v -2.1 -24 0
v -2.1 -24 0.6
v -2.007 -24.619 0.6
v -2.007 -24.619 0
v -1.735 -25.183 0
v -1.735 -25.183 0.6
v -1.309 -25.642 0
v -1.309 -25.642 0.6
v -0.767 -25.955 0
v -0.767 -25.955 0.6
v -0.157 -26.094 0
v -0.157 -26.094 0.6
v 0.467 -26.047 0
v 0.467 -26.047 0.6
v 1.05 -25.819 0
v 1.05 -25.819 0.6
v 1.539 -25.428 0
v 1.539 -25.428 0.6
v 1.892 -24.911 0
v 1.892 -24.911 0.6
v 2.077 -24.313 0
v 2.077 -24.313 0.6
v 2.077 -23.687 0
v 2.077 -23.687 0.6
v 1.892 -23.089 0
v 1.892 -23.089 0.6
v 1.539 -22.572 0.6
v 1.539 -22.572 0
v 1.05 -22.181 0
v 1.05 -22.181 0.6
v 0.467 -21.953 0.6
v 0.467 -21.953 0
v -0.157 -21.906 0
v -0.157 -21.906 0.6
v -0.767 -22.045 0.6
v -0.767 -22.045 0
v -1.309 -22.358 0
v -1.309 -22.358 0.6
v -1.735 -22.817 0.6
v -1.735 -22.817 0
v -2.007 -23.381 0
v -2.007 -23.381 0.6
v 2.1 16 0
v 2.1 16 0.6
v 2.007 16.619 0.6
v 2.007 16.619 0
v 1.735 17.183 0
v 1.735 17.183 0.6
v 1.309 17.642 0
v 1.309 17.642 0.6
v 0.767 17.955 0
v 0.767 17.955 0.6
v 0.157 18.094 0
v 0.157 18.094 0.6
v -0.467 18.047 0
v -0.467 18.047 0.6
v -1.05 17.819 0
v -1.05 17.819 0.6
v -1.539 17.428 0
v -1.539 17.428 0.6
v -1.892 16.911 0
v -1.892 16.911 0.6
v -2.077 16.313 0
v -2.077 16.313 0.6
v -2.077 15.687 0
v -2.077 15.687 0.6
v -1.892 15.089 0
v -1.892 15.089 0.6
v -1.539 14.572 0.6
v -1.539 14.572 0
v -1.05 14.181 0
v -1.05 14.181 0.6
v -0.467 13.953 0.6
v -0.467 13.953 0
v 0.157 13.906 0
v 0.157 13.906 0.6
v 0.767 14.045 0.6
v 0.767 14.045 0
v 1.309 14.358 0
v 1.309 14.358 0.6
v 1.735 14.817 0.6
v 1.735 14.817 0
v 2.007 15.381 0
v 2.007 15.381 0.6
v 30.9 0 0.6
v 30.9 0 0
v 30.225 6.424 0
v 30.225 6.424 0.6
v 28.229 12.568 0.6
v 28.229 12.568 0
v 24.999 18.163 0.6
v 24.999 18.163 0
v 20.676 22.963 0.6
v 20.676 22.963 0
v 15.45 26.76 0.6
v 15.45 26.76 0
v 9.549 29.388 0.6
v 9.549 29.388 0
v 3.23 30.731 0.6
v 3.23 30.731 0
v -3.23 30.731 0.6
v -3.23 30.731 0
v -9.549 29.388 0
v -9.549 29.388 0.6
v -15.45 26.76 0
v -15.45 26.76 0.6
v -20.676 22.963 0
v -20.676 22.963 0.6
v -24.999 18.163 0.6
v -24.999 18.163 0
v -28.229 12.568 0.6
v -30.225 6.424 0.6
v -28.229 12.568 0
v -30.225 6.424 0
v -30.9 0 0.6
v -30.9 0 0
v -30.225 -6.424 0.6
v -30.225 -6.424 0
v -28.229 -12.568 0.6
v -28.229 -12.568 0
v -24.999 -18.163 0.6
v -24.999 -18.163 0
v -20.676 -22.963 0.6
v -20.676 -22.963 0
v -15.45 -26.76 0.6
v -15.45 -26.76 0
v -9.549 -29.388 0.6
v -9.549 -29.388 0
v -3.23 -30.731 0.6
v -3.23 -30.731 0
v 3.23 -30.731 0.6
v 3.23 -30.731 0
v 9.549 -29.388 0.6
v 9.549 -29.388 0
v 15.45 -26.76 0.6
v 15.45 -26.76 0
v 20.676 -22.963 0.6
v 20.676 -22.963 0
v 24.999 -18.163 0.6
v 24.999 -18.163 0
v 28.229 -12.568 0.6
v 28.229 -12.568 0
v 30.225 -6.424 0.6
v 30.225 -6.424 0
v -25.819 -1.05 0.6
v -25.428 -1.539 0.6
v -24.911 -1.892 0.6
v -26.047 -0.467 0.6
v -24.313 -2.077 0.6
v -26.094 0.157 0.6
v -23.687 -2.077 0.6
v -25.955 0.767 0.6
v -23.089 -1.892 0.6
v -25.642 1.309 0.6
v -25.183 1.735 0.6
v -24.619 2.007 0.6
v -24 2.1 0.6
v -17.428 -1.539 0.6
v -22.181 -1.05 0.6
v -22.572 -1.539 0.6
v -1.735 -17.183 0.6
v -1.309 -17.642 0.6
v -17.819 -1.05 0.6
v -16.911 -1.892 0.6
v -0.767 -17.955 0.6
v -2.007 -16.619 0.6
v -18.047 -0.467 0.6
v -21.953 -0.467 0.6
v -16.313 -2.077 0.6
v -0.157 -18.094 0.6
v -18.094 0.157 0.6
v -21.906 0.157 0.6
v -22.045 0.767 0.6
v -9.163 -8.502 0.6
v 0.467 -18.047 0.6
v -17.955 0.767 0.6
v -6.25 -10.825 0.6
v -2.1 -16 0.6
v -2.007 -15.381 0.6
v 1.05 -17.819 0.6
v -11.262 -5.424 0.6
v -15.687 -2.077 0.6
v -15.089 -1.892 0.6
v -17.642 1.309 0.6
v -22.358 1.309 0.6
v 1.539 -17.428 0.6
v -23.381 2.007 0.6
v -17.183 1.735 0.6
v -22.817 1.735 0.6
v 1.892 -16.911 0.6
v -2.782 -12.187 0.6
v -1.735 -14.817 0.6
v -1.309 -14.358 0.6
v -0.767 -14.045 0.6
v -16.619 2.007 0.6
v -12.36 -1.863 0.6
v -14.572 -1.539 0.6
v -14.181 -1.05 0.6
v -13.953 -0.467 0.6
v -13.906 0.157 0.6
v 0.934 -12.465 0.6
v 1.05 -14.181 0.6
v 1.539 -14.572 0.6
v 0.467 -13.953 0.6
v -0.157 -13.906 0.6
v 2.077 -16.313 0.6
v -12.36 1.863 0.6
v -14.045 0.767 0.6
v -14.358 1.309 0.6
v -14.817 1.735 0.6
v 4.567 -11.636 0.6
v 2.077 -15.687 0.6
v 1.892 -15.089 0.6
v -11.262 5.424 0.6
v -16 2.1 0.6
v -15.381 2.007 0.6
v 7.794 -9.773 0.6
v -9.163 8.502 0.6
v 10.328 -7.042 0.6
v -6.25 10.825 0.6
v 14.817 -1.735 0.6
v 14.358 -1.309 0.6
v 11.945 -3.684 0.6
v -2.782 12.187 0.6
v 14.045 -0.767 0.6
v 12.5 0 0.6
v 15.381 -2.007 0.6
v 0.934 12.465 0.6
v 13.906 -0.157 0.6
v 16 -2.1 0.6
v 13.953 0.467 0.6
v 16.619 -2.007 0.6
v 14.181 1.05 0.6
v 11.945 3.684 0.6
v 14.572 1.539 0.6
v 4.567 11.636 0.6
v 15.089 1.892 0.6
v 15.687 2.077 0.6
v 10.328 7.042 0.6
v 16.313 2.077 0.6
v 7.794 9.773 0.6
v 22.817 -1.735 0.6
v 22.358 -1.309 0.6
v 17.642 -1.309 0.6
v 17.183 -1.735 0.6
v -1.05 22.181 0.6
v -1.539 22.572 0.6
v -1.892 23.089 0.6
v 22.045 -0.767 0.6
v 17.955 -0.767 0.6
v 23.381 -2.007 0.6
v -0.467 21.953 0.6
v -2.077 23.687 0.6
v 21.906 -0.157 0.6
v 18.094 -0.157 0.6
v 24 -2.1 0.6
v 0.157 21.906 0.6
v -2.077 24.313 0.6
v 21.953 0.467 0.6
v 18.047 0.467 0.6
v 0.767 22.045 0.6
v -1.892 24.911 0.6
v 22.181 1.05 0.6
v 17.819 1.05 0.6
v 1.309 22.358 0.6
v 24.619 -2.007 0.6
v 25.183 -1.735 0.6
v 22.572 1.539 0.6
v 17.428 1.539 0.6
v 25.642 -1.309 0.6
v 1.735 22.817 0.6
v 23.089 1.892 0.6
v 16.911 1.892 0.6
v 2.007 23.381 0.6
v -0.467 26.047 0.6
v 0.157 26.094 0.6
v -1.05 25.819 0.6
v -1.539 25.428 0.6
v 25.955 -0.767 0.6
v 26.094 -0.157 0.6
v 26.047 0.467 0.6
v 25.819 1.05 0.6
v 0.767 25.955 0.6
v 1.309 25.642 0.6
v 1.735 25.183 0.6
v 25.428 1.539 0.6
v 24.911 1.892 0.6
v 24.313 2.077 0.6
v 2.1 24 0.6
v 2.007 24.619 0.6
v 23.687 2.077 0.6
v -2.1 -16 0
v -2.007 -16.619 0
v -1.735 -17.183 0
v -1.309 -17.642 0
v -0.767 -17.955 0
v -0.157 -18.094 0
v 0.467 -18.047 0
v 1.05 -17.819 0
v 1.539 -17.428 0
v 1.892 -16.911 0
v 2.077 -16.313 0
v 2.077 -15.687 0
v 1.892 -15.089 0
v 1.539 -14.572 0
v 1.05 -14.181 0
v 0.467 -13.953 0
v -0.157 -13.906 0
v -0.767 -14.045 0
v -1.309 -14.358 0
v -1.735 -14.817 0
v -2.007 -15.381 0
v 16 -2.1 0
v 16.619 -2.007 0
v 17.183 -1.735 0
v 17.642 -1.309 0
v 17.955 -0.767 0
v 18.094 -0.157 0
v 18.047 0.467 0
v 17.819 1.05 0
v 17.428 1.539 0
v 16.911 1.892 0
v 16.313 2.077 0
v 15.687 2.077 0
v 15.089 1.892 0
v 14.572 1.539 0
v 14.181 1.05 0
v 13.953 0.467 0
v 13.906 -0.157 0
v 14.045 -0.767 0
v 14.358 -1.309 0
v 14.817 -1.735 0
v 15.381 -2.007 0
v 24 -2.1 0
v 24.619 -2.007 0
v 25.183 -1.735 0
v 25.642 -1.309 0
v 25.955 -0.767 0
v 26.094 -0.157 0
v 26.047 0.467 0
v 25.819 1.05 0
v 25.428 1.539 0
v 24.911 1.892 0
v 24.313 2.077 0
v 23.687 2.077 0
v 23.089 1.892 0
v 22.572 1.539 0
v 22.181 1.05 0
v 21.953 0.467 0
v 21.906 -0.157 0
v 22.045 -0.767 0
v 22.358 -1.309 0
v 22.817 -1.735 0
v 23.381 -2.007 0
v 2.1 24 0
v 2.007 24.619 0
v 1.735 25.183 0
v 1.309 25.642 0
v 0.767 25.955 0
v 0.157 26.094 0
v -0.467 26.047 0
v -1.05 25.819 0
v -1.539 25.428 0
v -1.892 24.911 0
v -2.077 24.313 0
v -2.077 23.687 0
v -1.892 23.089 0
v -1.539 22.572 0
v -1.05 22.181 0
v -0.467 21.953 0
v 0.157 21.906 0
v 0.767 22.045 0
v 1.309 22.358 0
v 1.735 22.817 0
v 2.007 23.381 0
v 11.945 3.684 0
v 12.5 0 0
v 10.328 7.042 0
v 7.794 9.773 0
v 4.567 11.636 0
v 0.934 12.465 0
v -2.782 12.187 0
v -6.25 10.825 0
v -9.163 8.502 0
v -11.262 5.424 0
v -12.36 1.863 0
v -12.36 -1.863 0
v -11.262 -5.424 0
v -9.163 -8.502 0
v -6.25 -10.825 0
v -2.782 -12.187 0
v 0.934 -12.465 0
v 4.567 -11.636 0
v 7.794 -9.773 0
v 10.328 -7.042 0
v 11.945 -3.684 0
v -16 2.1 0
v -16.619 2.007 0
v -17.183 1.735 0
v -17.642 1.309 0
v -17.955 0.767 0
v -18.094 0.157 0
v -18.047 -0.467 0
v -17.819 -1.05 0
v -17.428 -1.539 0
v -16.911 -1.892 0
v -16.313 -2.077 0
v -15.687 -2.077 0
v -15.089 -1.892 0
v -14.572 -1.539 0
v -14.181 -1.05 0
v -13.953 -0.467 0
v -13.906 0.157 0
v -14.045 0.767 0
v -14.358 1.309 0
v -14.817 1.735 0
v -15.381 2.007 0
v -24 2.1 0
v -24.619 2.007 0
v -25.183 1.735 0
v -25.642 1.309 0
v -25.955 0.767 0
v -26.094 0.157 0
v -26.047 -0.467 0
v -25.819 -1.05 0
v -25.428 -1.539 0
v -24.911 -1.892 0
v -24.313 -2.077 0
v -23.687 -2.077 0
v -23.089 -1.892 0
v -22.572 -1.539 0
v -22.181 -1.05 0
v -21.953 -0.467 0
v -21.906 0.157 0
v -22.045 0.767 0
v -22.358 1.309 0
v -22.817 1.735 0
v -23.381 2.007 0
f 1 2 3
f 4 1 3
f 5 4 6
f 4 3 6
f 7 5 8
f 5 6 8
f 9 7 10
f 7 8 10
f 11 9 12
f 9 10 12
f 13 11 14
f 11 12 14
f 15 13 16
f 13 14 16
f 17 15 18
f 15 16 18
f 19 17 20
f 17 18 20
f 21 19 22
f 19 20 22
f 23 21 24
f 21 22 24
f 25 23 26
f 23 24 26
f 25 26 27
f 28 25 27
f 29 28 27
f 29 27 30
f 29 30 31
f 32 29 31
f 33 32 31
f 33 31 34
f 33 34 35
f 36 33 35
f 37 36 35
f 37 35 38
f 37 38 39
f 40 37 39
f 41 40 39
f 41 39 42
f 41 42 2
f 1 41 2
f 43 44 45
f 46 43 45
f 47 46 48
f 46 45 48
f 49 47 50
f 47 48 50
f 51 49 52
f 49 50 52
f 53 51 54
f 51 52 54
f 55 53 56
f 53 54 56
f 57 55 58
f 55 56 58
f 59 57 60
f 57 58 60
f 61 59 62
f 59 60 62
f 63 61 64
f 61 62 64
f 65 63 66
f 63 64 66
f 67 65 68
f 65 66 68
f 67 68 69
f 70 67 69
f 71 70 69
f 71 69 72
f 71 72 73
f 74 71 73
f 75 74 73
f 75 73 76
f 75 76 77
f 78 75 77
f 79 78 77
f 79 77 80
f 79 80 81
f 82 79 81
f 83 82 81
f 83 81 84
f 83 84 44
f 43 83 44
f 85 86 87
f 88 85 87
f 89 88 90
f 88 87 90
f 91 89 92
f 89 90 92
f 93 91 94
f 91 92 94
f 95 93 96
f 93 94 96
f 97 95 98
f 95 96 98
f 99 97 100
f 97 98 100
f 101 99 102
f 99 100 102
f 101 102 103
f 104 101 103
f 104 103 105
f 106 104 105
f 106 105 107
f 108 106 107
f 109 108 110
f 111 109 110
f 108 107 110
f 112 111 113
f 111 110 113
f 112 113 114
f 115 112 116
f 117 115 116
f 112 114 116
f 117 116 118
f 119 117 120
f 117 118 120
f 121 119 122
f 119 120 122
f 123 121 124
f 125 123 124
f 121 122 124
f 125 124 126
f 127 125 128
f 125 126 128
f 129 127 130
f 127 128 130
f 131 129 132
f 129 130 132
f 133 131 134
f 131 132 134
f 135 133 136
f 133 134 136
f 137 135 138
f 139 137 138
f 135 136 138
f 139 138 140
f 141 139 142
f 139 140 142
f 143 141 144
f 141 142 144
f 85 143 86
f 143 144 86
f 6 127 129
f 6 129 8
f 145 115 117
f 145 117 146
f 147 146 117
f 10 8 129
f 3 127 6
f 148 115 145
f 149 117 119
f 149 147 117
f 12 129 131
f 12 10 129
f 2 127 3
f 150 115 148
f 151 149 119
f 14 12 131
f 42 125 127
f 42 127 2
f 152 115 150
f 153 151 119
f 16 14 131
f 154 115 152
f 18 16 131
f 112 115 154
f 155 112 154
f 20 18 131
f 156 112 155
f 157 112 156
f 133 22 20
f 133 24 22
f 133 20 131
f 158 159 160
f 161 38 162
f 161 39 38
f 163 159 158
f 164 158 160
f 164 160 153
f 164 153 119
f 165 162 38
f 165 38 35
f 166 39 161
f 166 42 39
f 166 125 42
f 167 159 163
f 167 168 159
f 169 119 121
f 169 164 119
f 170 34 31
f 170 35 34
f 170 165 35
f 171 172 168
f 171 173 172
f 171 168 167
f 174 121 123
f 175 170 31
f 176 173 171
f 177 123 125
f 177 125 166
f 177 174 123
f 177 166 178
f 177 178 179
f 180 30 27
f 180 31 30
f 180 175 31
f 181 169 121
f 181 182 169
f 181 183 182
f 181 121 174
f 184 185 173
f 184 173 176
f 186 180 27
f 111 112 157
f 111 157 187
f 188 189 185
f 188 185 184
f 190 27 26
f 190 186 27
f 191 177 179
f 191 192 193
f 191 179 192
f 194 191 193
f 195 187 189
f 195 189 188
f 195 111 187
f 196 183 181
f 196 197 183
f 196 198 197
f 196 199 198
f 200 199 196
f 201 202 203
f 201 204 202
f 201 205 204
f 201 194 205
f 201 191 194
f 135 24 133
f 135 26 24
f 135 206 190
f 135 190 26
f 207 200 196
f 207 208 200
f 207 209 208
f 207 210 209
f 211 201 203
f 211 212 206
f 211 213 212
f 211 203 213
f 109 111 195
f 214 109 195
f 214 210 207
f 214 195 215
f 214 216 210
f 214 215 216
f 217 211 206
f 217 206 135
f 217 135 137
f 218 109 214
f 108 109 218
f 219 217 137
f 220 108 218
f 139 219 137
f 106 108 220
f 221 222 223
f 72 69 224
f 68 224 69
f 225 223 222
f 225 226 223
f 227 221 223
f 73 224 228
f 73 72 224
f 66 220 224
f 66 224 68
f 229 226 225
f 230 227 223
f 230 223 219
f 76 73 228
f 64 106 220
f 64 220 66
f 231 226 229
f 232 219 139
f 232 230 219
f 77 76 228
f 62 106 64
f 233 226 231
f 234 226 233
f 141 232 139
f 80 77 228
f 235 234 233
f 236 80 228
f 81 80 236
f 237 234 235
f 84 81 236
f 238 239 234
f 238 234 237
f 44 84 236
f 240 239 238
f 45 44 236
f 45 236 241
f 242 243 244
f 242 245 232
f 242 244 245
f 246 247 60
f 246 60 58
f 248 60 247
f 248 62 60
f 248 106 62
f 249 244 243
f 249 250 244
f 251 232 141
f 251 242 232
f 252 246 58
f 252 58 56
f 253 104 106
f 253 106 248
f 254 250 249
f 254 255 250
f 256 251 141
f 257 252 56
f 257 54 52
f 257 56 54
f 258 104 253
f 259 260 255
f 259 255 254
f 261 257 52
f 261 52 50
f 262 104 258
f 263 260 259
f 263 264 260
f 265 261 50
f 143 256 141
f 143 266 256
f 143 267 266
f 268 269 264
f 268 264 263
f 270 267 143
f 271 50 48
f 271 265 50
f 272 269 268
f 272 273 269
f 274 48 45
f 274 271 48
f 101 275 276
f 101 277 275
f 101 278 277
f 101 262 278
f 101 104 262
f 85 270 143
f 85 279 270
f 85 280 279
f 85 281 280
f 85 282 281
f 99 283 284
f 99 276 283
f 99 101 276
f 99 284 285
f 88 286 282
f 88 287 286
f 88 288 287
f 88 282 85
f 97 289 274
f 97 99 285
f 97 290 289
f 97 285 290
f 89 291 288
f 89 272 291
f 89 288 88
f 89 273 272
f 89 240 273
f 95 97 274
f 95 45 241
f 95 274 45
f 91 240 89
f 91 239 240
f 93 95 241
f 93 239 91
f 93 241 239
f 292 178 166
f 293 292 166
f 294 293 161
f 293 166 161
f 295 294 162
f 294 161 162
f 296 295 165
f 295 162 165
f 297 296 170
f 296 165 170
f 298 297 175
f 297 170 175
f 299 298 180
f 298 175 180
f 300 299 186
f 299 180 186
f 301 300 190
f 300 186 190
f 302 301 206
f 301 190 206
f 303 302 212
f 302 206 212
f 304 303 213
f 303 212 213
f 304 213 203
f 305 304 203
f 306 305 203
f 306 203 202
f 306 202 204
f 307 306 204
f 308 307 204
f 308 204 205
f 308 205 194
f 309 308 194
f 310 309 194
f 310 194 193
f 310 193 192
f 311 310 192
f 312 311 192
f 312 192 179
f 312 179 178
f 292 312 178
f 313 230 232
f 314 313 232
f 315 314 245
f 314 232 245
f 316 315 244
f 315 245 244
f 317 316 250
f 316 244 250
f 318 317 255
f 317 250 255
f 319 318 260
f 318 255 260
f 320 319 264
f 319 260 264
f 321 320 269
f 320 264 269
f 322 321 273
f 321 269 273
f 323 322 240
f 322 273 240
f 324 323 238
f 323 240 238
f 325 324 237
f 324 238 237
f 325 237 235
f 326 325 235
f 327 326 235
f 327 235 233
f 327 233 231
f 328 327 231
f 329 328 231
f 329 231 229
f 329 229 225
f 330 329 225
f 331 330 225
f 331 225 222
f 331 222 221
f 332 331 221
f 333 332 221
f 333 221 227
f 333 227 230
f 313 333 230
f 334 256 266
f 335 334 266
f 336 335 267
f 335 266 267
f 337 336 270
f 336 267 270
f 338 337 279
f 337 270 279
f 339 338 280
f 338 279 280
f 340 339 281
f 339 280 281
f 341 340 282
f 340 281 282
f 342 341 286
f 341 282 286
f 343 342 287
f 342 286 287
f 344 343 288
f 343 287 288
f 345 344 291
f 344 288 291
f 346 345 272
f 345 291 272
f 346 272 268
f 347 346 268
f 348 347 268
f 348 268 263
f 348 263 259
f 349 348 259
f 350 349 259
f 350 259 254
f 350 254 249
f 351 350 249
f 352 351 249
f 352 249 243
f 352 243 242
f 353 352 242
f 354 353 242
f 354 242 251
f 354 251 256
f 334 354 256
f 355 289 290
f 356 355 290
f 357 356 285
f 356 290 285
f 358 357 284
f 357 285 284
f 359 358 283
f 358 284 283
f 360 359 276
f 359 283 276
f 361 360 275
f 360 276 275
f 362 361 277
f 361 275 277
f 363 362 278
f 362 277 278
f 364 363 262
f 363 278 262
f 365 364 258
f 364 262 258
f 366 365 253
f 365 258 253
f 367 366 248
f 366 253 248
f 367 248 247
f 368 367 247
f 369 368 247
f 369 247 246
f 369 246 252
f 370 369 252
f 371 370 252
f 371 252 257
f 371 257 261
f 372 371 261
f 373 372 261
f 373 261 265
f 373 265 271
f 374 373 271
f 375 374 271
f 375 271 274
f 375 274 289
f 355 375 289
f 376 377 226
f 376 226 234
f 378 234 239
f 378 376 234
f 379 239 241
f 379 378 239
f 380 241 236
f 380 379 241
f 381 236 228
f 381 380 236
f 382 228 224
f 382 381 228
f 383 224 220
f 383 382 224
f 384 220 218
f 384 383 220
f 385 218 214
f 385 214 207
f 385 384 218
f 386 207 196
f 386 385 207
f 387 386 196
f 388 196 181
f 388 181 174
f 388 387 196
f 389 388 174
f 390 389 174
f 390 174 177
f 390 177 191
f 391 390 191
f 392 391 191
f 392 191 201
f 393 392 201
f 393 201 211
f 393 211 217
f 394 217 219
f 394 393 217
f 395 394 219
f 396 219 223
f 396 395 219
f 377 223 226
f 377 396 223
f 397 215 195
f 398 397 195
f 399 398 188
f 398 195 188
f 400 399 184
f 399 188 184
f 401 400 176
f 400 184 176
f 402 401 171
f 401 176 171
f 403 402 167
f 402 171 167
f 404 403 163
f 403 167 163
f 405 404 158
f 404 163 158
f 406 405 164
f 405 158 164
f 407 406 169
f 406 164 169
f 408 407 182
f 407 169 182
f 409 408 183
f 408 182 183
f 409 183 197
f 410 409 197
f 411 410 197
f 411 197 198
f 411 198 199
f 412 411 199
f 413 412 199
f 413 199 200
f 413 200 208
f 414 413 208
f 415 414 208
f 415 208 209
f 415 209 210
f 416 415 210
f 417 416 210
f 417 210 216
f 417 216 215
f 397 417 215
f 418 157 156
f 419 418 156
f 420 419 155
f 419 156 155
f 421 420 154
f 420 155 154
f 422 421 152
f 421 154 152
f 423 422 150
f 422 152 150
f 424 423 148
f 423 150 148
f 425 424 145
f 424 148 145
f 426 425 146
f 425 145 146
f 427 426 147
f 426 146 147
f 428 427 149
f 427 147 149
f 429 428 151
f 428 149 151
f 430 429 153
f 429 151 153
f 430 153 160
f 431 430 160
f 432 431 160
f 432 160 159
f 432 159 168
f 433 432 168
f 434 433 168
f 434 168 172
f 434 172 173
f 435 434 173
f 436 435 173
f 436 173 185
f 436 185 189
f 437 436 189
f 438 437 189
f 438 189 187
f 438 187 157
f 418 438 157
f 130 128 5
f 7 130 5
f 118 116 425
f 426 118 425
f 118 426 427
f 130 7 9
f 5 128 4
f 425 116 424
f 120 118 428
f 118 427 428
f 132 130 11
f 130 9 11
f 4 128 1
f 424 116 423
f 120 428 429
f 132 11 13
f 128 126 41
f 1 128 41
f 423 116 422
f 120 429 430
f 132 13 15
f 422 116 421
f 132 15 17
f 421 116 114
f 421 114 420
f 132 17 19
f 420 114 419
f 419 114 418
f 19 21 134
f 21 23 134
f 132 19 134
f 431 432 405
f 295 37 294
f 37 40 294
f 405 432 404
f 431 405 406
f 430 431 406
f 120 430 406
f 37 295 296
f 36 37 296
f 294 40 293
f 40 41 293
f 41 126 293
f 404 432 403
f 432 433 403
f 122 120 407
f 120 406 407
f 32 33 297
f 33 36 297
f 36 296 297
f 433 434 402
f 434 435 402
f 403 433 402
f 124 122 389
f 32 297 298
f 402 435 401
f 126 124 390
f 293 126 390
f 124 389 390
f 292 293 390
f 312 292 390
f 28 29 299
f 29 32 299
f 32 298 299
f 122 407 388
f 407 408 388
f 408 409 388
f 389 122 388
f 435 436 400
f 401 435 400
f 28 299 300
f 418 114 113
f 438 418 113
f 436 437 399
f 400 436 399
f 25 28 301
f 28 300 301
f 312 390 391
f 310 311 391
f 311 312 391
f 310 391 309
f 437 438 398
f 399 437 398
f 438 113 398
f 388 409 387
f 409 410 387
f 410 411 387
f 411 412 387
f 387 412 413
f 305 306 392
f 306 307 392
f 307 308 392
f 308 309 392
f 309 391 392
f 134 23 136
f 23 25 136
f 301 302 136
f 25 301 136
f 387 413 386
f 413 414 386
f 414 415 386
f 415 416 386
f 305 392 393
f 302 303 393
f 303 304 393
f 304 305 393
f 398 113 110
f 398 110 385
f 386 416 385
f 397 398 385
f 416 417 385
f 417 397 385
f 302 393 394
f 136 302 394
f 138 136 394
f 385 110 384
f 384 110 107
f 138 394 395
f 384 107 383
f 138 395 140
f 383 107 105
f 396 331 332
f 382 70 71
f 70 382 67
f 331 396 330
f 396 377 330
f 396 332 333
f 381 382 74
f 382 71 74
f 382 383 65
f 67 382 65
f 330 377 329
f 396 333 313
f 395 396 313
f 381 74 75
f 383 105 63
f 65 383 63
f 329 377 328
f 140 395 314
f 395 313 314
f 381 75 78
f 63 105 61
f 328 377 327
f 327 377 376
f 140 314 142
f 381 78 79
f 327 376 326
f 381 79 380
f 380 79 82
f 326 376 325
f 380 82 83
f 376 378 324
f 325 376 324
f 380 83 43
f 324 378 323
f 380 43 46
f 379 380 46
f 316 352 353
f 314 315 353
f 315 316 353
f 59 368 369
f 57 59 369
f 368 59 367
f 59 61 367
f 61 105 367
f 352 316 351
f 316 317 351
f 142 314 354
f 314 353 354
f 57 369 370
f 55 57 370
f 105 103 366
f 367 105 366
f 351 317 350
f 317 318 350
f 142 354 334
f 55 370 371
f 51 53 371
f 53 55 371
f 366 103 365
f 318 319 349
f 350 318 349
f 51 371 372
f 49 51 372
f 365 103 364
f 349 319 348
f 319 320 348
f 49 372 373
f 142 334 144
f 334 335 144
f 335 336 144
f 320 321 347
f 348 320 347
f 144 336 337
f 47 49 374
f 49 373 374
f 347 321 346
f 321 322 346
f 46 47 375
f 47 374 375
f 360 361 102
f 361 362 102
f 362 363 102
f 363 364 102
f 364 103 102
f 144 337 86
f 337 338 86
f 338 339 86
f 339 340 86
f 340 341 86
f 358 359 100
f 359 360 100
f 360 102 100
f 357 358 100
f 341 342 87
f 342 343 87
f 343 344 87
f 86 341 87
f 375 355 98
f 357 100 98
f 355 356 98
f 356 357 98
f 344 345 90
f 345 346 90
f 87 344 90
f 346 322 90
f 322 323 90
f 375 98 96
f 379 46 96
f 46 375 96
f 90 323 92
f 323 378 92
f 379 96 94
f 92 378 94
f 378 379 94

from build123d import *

# Parameters (mm, degrees)
ESQUISSE1_R                  = 30.9
ESQUISSE1_R_2                = 12.5
BOSS_EXTRU_1_DEPTH           = 0.6
ESQUISSE2_R                  = 2.1
ENL_V_MAT_EXTRU_1_DEPTH      = 44.703317952
R_P_TITION_CIRCULAIRE1_COUNT = 4


with BuildPart() as part:
    # Esquisse1 → Boss.-Extru.1 (new body)
    with BuildSketch(Plane.XY):
        Circle(ESQUISSE1_R)
        Circle(ESQUISSE1_R_2, mode=Mode.SUBTRACT)
    extrude(amount=BOSS_EXTRU_1_DEPTH)

    # Esquisse2 → Enlèv. mat.-Extru.1 (cut, through all)
    with BuildSketch(Plane.XY.offset(0.6)):
        with Locations((0, 16)):
            Circle(ESQUISSE2_R)
        with Locations((0, 24)):
            Circle(ESQUISSE2_R)
    enl_v_mat_extru_1 = extrude(amount=-ENL_V_MAT_EXTRU_1_DEPTH, mode=Mode.SUBTRACT)

    # Répétition circulaire1: Enlèv. mat.-Extru.1 ×4 about axis
    r_p_tition_circulaire1_axis = Axis((0, 0, 0), (0, 0, 1))
    for i in range(1, R_P_TITION_CIRCULAIRE1_COUNT):
        add(enl_v_mat_extru_1.rotate(r_p_tition_circulaire1_axis, i * 360 / R_P_TITION_CIRCULAIRE1_COUNT), mode=Mode.SUBTRACT)


solid = part.part
